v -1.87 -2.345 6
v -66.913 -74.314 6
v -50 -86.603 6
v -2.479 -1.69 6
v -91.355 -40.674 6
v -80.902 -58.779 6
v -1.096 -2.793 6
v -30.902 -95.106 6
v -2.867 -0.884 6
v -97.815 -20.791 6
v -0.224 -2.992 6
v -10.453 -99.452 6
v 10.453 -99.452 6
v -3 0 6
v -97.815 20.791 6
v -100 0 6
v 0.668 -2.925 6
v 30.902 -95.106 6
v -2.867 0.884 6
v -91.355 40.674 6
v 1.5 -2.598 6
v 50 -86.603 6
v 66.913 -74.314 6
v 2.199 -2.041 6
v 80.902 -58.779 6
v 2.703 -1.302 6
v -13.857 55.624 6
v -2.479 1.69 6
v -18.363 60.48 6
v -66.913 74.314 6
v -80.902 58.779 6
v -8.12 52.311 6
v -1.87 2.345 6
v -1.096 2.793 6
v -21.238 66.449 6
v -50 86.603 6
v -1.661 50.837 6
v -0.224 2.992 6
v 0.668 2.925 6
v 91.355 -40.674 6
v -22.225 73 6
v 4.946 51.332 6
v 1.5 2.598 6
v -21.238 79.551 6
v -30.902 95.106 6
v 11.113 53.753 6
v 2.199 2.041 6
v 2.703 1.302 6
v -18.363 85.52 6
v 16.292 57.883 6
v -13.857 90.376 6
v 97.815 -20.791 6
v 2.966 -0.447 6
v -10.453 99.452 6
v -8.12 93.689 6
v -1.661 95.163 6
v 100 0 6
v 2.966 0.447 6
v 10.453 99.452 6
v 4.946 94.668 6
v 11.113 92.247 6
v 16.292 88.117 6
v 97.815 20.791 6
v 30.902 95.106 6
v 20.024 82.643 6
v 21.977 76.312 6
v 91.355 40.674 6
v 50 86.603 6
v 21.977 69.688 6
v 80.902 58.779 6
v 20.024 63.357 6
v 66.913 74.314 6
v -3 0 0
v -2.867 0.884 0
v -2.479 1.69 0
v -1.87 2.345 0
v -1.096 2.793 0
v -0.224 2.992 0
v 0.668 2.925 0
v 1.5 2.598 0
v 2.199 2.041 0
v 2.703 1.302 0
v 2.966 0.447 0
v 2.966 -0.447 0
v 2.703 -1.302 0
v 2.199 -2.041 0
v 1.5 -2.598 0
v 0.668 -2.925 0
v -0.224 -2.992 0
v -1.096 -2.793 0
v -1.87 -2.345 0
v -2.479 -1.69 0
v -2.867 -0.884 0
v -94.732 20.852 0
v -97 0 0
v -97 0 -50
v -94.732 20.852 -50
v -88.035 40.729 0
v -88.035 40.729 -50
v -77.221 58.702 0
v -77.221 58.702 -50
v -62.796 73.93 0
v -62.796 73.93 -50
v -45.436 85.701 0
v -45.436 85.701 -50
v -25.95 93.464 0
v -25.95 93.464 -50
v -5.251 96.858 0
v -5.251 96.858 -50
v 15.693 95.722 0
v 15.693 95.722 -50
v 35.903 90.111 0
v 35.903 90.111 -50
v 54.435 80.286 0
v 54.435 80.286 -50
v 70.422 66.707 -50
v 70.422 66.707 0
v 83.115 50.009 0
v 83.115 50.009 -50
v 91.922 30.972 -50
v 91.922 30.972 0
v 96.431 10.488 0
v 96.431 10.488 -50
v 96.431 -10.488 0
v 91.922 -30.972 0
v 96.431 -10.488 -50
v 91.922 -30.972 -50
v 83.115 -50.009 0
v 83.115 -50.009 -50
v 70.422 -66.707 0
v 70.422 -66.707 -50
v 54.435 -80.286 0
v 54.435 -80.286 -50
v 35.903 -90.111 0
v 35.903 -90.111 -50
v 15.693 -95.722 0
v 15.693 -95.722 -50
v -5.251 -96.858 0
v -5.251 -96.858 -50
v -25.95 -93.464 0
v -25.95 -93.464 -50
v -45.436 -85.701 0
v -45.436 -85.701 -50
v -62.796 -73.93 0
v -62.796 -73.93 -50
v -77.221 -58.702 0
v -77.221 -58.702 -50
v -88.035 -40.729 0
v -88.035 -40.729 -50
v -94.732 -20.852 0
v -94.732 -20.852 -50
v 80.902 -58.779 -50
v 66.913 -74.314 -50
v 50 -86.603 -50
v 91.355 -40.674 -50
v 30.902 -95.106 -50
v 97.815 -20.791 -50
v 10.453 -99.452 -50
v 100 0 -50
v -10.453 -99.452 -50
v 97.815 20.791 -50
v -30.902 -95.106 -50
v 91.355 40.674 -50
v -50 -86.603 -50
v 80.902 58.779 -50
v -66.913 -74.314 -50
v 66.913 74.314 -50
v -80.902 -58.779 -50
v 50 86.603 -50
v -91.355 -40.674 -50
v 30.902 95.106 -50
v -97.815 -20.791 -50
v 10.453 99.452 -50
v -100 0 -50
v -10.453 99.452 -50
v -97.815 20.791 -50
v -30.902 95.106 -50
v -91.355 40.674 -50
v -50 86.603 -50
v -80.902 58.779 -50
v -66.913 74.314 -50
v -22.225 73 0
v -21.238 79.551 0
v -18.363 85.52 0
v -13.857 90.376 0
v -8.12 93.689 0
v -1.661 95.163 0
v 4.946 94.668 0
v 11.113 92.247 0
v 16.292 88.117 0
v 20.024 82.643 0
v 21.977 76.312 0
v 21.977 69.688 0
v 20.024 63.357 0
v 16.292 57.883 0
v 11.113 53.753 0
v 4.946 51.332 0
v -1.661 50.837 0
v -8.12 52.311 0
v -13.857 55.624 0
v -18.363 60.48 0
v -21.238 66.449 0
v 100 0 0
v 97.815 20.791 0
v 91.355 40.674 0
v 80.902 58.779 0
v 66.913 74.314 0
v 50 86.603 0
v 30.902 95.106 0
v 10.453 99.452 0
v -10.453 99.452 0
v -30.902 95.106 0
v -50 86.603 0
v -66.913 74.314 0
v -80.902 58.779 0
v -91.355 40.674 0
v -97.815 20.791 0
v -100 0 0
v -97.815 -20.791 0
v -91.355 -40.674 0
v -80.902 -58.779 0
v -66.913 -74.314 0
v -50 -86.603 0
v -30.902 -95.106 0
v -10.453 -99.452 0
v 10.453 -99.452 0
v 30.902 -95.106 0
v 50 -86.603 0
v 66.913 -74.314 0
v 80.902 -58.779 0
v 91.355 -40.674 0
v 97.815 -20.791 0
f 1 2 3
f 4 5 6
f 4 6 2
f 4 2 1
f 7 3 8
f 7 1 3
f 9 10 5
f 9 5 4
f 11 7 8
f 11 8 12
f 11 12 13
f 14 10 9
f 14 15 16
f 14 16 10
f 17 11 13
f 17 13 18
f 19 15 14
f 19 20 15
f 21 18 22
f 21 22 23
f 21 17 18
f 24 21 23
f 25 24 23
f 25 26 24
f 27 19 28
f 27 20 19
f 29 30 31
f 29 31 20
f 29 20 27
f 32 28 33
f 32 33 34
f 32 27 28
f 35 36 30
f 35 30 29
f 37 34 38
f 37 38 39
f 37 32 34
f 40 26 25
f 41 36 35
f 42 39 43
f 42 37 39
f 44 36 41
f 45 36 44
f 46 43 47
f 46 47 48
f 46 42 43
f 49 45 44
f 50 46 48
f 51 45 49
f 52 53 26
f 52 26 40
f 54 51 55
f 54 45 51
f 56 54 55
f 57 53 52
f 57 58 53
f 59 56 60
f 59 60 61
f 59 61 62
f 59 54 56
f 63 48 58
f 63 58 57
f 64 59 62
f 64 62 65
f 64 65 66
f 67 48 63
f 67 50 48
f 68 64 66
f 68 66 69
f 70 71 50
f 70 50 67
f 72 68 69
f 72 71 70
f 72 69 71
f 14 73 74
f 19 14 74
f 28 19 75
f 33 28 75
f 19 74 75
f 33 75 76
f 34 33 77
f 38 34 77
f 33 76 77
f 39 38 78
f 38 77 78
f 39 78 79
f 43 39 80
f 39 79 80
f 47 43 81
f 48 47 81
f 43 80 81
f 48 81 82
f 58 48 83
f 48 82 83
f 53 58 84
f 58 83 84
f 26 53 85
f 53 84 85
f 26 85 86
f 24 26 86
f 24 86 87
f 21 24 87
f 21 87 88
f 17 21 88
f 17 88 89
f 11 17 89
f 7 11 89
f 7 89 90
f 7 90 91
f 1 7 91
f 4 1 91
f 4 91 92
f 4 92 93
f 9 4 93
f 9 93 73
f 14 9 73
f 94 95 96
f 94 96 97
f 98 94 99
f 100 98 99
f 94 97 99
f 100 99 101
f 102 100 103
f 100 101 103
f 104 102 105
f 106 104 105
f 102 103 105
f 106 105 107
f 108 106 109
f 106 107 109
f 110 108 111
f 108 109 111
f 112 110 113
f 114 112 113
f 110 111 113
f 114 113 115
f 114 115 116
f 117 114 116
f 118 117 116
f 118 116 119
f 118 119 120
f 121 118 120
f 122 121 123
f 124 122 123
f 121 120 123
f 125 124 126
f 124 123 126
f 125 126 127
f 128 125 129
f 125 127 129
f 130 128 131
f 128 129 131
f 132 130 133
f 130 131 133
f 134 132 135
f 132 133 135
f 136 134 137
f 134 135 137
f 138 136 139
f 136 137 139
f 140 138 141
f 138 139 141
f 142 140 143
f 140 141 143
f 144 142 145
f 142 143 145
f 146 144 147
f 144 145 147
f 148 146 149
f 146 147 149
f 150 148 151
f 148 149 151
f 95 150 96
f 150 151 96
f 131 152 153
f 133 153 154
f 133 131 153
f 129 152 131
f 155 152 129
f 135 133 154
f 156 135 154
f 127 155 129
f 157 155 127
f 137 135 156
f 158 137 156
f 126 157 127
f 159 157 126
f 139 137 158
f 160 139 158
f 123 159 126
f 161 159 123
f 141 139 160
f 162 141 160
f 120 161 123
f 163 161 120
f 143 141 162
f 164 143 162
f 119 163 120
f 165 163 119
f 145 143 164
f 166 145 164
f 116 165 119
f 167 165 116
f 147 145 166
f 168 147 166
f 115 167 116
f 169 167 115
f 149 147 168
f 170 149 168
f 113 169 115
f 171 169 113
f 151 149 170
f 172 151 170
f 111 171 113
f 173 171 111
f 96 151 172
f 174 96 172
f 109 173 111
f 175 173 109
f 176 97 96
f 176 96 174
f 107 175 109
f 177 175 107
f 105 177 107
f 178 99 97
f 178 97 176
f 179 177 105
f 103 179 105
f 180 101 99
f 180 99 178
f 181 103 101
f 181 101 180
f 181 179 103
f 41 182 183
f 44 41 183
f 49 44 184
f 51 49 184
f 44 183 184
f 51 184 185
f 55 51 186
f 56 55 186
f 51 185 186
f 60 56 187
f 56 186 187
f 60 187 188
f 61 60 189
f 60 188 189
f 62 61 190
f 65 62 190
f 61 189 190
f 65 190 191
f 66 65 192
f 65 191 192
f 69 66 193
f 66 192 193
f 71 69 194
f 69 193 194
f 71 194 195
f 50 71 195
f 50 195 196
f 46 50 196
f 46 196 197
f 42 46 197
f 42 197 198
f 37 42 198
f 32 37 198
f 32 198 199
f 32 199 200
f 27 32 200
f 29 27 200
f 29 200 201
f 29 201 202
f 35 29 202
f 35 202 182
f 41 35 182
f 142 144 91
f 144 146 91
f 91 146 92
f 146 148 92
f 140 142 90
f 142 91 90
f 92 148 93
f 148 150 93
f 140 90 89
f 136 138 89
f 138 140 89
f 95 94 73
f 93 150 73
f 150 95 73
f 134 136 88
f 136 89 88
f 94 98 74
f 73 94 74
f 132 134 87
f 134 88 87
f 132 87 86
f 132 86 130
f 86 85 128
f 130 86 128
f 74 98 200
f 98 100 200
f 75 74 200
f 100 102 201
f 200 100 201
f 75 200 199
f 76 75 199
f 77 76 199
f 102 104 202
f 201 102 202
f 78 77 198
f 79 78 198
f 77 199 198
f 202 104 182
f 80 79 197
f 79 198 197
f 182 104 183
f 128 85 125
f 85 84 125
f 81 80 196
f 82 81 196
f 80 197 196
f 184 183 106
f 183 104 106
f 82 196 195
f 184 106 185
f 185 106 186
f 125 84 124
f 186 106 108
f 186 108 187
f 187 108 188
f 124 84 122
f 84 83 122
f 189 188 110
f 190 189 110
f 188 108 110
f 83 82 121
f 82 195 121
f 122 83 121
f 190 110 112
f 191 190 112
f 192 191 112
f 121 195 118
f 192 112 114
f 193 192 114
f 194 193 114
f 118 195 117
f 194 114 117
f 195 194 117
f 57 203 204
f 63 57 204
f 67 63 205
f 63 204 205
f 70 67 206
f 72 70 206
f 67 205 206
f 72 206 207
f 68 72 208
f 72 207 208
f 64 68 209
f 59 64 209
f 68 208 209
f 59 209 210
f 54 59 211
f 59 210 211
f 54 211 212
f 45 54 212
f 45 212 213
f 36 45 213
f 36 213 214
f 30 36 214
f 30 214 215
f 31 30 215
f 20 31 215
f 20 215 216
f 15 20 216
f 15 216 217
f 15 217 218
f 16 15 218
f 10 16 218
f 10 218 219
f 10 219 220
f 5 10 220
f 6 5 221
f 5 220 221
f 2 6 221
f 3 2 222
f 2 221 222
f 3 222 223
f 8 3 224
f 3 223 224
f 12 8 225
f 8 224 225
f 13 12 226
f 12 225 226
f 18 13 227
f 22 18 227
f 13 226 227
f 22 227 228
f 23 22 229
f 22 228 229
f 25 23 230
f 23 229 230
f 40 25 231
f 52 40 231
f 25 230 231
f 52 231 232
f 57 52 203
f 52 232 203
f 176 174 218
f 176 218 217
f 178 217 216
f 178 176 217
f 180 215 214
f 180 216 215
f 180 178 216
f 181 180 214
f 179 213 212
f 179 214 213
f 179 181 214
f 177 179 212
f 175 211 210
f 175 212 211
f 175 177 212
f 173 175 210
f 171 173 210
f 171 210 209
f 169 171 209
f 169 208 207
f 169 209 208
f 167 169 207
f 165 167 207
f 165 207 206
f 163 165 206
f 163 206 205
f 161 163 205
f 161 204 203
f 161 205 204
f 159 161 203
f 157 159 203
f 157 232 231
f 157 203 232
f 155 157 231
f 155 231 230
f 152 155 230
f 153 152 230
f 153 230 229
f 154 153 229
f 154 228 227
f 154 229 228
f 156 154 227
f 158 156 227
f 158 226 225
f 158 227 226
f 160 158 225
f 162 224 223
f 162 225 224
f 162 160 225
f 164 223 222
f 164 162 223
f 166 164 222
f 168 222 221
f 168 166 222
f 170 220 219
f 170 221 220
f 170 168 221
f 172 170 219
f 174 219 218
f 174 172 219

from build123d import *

# Parameters (mm, degrees)
SKETCH1_R           = 100
BOSS_EXTRUDE1_DEPTH = 6
BOSS_EXTRUDE2_START = 50
SKETCH2_R           = 100
SKETCH2_R_2         = 97
BOSS_EXTRUDE2_DEPTH = 50
SKETCH4_R           = 22.225
CUT_EXTRUDE2_DEPTH  = 50
SKETCH5_R           = 3
CUT_EXTRUDE3_DEPTH  = 50


with BuildPart() as part:
    # Sketch1 → Boss-Extrude1 (new body)
    with BuildSketch(Plane.XY):
        Circle(SKETCH1_R)
    extrude(amount=BOSS_EXTRUDE1_DEPTH)

    # Sketch2 → Boss-Extrude2 (add)
    with BuildSketch(Plane(origin=(0, 0, 0), x_dir=(-1, 0, 0), z_dir=(0, 0, -1)).offset(BOSS_EXTRUDE2_START)):
        Circle(SKETCH2_R)
        Circle(SKETCH2_R_2, mode=Mode.SUBTRACT)
    extrude(amount=-BOSS_EXTRUDE2_DEPTH)

    # Sketch4 → Cut-Extrude2 (cut)
    with BuildSketch(Plane(origin=(0, 0, 0), x_dir=(-1, 0, 0), z_dir=(0, 0, -1))):
        with Locations((0, 73)):
            Circle(SKETCH4_R)
    extrude(amount=-CUT_EXTRUDE2_DEPTH, mode=Mode.SUBTRACT)

    # Sketch5 → Cut-Extrude3 (cut)
    with BuildSketch(Plane(origin=(0, 0, 0), x_dir=(-1, 0, 0), z_dir=(0, 0, -1))):
        Circle(SKETCH5_R)
    extrude(amount=-CUT_EXTRUDE3_DEPTH, mode=Mode.SUBTRACT)


solid = part.part
